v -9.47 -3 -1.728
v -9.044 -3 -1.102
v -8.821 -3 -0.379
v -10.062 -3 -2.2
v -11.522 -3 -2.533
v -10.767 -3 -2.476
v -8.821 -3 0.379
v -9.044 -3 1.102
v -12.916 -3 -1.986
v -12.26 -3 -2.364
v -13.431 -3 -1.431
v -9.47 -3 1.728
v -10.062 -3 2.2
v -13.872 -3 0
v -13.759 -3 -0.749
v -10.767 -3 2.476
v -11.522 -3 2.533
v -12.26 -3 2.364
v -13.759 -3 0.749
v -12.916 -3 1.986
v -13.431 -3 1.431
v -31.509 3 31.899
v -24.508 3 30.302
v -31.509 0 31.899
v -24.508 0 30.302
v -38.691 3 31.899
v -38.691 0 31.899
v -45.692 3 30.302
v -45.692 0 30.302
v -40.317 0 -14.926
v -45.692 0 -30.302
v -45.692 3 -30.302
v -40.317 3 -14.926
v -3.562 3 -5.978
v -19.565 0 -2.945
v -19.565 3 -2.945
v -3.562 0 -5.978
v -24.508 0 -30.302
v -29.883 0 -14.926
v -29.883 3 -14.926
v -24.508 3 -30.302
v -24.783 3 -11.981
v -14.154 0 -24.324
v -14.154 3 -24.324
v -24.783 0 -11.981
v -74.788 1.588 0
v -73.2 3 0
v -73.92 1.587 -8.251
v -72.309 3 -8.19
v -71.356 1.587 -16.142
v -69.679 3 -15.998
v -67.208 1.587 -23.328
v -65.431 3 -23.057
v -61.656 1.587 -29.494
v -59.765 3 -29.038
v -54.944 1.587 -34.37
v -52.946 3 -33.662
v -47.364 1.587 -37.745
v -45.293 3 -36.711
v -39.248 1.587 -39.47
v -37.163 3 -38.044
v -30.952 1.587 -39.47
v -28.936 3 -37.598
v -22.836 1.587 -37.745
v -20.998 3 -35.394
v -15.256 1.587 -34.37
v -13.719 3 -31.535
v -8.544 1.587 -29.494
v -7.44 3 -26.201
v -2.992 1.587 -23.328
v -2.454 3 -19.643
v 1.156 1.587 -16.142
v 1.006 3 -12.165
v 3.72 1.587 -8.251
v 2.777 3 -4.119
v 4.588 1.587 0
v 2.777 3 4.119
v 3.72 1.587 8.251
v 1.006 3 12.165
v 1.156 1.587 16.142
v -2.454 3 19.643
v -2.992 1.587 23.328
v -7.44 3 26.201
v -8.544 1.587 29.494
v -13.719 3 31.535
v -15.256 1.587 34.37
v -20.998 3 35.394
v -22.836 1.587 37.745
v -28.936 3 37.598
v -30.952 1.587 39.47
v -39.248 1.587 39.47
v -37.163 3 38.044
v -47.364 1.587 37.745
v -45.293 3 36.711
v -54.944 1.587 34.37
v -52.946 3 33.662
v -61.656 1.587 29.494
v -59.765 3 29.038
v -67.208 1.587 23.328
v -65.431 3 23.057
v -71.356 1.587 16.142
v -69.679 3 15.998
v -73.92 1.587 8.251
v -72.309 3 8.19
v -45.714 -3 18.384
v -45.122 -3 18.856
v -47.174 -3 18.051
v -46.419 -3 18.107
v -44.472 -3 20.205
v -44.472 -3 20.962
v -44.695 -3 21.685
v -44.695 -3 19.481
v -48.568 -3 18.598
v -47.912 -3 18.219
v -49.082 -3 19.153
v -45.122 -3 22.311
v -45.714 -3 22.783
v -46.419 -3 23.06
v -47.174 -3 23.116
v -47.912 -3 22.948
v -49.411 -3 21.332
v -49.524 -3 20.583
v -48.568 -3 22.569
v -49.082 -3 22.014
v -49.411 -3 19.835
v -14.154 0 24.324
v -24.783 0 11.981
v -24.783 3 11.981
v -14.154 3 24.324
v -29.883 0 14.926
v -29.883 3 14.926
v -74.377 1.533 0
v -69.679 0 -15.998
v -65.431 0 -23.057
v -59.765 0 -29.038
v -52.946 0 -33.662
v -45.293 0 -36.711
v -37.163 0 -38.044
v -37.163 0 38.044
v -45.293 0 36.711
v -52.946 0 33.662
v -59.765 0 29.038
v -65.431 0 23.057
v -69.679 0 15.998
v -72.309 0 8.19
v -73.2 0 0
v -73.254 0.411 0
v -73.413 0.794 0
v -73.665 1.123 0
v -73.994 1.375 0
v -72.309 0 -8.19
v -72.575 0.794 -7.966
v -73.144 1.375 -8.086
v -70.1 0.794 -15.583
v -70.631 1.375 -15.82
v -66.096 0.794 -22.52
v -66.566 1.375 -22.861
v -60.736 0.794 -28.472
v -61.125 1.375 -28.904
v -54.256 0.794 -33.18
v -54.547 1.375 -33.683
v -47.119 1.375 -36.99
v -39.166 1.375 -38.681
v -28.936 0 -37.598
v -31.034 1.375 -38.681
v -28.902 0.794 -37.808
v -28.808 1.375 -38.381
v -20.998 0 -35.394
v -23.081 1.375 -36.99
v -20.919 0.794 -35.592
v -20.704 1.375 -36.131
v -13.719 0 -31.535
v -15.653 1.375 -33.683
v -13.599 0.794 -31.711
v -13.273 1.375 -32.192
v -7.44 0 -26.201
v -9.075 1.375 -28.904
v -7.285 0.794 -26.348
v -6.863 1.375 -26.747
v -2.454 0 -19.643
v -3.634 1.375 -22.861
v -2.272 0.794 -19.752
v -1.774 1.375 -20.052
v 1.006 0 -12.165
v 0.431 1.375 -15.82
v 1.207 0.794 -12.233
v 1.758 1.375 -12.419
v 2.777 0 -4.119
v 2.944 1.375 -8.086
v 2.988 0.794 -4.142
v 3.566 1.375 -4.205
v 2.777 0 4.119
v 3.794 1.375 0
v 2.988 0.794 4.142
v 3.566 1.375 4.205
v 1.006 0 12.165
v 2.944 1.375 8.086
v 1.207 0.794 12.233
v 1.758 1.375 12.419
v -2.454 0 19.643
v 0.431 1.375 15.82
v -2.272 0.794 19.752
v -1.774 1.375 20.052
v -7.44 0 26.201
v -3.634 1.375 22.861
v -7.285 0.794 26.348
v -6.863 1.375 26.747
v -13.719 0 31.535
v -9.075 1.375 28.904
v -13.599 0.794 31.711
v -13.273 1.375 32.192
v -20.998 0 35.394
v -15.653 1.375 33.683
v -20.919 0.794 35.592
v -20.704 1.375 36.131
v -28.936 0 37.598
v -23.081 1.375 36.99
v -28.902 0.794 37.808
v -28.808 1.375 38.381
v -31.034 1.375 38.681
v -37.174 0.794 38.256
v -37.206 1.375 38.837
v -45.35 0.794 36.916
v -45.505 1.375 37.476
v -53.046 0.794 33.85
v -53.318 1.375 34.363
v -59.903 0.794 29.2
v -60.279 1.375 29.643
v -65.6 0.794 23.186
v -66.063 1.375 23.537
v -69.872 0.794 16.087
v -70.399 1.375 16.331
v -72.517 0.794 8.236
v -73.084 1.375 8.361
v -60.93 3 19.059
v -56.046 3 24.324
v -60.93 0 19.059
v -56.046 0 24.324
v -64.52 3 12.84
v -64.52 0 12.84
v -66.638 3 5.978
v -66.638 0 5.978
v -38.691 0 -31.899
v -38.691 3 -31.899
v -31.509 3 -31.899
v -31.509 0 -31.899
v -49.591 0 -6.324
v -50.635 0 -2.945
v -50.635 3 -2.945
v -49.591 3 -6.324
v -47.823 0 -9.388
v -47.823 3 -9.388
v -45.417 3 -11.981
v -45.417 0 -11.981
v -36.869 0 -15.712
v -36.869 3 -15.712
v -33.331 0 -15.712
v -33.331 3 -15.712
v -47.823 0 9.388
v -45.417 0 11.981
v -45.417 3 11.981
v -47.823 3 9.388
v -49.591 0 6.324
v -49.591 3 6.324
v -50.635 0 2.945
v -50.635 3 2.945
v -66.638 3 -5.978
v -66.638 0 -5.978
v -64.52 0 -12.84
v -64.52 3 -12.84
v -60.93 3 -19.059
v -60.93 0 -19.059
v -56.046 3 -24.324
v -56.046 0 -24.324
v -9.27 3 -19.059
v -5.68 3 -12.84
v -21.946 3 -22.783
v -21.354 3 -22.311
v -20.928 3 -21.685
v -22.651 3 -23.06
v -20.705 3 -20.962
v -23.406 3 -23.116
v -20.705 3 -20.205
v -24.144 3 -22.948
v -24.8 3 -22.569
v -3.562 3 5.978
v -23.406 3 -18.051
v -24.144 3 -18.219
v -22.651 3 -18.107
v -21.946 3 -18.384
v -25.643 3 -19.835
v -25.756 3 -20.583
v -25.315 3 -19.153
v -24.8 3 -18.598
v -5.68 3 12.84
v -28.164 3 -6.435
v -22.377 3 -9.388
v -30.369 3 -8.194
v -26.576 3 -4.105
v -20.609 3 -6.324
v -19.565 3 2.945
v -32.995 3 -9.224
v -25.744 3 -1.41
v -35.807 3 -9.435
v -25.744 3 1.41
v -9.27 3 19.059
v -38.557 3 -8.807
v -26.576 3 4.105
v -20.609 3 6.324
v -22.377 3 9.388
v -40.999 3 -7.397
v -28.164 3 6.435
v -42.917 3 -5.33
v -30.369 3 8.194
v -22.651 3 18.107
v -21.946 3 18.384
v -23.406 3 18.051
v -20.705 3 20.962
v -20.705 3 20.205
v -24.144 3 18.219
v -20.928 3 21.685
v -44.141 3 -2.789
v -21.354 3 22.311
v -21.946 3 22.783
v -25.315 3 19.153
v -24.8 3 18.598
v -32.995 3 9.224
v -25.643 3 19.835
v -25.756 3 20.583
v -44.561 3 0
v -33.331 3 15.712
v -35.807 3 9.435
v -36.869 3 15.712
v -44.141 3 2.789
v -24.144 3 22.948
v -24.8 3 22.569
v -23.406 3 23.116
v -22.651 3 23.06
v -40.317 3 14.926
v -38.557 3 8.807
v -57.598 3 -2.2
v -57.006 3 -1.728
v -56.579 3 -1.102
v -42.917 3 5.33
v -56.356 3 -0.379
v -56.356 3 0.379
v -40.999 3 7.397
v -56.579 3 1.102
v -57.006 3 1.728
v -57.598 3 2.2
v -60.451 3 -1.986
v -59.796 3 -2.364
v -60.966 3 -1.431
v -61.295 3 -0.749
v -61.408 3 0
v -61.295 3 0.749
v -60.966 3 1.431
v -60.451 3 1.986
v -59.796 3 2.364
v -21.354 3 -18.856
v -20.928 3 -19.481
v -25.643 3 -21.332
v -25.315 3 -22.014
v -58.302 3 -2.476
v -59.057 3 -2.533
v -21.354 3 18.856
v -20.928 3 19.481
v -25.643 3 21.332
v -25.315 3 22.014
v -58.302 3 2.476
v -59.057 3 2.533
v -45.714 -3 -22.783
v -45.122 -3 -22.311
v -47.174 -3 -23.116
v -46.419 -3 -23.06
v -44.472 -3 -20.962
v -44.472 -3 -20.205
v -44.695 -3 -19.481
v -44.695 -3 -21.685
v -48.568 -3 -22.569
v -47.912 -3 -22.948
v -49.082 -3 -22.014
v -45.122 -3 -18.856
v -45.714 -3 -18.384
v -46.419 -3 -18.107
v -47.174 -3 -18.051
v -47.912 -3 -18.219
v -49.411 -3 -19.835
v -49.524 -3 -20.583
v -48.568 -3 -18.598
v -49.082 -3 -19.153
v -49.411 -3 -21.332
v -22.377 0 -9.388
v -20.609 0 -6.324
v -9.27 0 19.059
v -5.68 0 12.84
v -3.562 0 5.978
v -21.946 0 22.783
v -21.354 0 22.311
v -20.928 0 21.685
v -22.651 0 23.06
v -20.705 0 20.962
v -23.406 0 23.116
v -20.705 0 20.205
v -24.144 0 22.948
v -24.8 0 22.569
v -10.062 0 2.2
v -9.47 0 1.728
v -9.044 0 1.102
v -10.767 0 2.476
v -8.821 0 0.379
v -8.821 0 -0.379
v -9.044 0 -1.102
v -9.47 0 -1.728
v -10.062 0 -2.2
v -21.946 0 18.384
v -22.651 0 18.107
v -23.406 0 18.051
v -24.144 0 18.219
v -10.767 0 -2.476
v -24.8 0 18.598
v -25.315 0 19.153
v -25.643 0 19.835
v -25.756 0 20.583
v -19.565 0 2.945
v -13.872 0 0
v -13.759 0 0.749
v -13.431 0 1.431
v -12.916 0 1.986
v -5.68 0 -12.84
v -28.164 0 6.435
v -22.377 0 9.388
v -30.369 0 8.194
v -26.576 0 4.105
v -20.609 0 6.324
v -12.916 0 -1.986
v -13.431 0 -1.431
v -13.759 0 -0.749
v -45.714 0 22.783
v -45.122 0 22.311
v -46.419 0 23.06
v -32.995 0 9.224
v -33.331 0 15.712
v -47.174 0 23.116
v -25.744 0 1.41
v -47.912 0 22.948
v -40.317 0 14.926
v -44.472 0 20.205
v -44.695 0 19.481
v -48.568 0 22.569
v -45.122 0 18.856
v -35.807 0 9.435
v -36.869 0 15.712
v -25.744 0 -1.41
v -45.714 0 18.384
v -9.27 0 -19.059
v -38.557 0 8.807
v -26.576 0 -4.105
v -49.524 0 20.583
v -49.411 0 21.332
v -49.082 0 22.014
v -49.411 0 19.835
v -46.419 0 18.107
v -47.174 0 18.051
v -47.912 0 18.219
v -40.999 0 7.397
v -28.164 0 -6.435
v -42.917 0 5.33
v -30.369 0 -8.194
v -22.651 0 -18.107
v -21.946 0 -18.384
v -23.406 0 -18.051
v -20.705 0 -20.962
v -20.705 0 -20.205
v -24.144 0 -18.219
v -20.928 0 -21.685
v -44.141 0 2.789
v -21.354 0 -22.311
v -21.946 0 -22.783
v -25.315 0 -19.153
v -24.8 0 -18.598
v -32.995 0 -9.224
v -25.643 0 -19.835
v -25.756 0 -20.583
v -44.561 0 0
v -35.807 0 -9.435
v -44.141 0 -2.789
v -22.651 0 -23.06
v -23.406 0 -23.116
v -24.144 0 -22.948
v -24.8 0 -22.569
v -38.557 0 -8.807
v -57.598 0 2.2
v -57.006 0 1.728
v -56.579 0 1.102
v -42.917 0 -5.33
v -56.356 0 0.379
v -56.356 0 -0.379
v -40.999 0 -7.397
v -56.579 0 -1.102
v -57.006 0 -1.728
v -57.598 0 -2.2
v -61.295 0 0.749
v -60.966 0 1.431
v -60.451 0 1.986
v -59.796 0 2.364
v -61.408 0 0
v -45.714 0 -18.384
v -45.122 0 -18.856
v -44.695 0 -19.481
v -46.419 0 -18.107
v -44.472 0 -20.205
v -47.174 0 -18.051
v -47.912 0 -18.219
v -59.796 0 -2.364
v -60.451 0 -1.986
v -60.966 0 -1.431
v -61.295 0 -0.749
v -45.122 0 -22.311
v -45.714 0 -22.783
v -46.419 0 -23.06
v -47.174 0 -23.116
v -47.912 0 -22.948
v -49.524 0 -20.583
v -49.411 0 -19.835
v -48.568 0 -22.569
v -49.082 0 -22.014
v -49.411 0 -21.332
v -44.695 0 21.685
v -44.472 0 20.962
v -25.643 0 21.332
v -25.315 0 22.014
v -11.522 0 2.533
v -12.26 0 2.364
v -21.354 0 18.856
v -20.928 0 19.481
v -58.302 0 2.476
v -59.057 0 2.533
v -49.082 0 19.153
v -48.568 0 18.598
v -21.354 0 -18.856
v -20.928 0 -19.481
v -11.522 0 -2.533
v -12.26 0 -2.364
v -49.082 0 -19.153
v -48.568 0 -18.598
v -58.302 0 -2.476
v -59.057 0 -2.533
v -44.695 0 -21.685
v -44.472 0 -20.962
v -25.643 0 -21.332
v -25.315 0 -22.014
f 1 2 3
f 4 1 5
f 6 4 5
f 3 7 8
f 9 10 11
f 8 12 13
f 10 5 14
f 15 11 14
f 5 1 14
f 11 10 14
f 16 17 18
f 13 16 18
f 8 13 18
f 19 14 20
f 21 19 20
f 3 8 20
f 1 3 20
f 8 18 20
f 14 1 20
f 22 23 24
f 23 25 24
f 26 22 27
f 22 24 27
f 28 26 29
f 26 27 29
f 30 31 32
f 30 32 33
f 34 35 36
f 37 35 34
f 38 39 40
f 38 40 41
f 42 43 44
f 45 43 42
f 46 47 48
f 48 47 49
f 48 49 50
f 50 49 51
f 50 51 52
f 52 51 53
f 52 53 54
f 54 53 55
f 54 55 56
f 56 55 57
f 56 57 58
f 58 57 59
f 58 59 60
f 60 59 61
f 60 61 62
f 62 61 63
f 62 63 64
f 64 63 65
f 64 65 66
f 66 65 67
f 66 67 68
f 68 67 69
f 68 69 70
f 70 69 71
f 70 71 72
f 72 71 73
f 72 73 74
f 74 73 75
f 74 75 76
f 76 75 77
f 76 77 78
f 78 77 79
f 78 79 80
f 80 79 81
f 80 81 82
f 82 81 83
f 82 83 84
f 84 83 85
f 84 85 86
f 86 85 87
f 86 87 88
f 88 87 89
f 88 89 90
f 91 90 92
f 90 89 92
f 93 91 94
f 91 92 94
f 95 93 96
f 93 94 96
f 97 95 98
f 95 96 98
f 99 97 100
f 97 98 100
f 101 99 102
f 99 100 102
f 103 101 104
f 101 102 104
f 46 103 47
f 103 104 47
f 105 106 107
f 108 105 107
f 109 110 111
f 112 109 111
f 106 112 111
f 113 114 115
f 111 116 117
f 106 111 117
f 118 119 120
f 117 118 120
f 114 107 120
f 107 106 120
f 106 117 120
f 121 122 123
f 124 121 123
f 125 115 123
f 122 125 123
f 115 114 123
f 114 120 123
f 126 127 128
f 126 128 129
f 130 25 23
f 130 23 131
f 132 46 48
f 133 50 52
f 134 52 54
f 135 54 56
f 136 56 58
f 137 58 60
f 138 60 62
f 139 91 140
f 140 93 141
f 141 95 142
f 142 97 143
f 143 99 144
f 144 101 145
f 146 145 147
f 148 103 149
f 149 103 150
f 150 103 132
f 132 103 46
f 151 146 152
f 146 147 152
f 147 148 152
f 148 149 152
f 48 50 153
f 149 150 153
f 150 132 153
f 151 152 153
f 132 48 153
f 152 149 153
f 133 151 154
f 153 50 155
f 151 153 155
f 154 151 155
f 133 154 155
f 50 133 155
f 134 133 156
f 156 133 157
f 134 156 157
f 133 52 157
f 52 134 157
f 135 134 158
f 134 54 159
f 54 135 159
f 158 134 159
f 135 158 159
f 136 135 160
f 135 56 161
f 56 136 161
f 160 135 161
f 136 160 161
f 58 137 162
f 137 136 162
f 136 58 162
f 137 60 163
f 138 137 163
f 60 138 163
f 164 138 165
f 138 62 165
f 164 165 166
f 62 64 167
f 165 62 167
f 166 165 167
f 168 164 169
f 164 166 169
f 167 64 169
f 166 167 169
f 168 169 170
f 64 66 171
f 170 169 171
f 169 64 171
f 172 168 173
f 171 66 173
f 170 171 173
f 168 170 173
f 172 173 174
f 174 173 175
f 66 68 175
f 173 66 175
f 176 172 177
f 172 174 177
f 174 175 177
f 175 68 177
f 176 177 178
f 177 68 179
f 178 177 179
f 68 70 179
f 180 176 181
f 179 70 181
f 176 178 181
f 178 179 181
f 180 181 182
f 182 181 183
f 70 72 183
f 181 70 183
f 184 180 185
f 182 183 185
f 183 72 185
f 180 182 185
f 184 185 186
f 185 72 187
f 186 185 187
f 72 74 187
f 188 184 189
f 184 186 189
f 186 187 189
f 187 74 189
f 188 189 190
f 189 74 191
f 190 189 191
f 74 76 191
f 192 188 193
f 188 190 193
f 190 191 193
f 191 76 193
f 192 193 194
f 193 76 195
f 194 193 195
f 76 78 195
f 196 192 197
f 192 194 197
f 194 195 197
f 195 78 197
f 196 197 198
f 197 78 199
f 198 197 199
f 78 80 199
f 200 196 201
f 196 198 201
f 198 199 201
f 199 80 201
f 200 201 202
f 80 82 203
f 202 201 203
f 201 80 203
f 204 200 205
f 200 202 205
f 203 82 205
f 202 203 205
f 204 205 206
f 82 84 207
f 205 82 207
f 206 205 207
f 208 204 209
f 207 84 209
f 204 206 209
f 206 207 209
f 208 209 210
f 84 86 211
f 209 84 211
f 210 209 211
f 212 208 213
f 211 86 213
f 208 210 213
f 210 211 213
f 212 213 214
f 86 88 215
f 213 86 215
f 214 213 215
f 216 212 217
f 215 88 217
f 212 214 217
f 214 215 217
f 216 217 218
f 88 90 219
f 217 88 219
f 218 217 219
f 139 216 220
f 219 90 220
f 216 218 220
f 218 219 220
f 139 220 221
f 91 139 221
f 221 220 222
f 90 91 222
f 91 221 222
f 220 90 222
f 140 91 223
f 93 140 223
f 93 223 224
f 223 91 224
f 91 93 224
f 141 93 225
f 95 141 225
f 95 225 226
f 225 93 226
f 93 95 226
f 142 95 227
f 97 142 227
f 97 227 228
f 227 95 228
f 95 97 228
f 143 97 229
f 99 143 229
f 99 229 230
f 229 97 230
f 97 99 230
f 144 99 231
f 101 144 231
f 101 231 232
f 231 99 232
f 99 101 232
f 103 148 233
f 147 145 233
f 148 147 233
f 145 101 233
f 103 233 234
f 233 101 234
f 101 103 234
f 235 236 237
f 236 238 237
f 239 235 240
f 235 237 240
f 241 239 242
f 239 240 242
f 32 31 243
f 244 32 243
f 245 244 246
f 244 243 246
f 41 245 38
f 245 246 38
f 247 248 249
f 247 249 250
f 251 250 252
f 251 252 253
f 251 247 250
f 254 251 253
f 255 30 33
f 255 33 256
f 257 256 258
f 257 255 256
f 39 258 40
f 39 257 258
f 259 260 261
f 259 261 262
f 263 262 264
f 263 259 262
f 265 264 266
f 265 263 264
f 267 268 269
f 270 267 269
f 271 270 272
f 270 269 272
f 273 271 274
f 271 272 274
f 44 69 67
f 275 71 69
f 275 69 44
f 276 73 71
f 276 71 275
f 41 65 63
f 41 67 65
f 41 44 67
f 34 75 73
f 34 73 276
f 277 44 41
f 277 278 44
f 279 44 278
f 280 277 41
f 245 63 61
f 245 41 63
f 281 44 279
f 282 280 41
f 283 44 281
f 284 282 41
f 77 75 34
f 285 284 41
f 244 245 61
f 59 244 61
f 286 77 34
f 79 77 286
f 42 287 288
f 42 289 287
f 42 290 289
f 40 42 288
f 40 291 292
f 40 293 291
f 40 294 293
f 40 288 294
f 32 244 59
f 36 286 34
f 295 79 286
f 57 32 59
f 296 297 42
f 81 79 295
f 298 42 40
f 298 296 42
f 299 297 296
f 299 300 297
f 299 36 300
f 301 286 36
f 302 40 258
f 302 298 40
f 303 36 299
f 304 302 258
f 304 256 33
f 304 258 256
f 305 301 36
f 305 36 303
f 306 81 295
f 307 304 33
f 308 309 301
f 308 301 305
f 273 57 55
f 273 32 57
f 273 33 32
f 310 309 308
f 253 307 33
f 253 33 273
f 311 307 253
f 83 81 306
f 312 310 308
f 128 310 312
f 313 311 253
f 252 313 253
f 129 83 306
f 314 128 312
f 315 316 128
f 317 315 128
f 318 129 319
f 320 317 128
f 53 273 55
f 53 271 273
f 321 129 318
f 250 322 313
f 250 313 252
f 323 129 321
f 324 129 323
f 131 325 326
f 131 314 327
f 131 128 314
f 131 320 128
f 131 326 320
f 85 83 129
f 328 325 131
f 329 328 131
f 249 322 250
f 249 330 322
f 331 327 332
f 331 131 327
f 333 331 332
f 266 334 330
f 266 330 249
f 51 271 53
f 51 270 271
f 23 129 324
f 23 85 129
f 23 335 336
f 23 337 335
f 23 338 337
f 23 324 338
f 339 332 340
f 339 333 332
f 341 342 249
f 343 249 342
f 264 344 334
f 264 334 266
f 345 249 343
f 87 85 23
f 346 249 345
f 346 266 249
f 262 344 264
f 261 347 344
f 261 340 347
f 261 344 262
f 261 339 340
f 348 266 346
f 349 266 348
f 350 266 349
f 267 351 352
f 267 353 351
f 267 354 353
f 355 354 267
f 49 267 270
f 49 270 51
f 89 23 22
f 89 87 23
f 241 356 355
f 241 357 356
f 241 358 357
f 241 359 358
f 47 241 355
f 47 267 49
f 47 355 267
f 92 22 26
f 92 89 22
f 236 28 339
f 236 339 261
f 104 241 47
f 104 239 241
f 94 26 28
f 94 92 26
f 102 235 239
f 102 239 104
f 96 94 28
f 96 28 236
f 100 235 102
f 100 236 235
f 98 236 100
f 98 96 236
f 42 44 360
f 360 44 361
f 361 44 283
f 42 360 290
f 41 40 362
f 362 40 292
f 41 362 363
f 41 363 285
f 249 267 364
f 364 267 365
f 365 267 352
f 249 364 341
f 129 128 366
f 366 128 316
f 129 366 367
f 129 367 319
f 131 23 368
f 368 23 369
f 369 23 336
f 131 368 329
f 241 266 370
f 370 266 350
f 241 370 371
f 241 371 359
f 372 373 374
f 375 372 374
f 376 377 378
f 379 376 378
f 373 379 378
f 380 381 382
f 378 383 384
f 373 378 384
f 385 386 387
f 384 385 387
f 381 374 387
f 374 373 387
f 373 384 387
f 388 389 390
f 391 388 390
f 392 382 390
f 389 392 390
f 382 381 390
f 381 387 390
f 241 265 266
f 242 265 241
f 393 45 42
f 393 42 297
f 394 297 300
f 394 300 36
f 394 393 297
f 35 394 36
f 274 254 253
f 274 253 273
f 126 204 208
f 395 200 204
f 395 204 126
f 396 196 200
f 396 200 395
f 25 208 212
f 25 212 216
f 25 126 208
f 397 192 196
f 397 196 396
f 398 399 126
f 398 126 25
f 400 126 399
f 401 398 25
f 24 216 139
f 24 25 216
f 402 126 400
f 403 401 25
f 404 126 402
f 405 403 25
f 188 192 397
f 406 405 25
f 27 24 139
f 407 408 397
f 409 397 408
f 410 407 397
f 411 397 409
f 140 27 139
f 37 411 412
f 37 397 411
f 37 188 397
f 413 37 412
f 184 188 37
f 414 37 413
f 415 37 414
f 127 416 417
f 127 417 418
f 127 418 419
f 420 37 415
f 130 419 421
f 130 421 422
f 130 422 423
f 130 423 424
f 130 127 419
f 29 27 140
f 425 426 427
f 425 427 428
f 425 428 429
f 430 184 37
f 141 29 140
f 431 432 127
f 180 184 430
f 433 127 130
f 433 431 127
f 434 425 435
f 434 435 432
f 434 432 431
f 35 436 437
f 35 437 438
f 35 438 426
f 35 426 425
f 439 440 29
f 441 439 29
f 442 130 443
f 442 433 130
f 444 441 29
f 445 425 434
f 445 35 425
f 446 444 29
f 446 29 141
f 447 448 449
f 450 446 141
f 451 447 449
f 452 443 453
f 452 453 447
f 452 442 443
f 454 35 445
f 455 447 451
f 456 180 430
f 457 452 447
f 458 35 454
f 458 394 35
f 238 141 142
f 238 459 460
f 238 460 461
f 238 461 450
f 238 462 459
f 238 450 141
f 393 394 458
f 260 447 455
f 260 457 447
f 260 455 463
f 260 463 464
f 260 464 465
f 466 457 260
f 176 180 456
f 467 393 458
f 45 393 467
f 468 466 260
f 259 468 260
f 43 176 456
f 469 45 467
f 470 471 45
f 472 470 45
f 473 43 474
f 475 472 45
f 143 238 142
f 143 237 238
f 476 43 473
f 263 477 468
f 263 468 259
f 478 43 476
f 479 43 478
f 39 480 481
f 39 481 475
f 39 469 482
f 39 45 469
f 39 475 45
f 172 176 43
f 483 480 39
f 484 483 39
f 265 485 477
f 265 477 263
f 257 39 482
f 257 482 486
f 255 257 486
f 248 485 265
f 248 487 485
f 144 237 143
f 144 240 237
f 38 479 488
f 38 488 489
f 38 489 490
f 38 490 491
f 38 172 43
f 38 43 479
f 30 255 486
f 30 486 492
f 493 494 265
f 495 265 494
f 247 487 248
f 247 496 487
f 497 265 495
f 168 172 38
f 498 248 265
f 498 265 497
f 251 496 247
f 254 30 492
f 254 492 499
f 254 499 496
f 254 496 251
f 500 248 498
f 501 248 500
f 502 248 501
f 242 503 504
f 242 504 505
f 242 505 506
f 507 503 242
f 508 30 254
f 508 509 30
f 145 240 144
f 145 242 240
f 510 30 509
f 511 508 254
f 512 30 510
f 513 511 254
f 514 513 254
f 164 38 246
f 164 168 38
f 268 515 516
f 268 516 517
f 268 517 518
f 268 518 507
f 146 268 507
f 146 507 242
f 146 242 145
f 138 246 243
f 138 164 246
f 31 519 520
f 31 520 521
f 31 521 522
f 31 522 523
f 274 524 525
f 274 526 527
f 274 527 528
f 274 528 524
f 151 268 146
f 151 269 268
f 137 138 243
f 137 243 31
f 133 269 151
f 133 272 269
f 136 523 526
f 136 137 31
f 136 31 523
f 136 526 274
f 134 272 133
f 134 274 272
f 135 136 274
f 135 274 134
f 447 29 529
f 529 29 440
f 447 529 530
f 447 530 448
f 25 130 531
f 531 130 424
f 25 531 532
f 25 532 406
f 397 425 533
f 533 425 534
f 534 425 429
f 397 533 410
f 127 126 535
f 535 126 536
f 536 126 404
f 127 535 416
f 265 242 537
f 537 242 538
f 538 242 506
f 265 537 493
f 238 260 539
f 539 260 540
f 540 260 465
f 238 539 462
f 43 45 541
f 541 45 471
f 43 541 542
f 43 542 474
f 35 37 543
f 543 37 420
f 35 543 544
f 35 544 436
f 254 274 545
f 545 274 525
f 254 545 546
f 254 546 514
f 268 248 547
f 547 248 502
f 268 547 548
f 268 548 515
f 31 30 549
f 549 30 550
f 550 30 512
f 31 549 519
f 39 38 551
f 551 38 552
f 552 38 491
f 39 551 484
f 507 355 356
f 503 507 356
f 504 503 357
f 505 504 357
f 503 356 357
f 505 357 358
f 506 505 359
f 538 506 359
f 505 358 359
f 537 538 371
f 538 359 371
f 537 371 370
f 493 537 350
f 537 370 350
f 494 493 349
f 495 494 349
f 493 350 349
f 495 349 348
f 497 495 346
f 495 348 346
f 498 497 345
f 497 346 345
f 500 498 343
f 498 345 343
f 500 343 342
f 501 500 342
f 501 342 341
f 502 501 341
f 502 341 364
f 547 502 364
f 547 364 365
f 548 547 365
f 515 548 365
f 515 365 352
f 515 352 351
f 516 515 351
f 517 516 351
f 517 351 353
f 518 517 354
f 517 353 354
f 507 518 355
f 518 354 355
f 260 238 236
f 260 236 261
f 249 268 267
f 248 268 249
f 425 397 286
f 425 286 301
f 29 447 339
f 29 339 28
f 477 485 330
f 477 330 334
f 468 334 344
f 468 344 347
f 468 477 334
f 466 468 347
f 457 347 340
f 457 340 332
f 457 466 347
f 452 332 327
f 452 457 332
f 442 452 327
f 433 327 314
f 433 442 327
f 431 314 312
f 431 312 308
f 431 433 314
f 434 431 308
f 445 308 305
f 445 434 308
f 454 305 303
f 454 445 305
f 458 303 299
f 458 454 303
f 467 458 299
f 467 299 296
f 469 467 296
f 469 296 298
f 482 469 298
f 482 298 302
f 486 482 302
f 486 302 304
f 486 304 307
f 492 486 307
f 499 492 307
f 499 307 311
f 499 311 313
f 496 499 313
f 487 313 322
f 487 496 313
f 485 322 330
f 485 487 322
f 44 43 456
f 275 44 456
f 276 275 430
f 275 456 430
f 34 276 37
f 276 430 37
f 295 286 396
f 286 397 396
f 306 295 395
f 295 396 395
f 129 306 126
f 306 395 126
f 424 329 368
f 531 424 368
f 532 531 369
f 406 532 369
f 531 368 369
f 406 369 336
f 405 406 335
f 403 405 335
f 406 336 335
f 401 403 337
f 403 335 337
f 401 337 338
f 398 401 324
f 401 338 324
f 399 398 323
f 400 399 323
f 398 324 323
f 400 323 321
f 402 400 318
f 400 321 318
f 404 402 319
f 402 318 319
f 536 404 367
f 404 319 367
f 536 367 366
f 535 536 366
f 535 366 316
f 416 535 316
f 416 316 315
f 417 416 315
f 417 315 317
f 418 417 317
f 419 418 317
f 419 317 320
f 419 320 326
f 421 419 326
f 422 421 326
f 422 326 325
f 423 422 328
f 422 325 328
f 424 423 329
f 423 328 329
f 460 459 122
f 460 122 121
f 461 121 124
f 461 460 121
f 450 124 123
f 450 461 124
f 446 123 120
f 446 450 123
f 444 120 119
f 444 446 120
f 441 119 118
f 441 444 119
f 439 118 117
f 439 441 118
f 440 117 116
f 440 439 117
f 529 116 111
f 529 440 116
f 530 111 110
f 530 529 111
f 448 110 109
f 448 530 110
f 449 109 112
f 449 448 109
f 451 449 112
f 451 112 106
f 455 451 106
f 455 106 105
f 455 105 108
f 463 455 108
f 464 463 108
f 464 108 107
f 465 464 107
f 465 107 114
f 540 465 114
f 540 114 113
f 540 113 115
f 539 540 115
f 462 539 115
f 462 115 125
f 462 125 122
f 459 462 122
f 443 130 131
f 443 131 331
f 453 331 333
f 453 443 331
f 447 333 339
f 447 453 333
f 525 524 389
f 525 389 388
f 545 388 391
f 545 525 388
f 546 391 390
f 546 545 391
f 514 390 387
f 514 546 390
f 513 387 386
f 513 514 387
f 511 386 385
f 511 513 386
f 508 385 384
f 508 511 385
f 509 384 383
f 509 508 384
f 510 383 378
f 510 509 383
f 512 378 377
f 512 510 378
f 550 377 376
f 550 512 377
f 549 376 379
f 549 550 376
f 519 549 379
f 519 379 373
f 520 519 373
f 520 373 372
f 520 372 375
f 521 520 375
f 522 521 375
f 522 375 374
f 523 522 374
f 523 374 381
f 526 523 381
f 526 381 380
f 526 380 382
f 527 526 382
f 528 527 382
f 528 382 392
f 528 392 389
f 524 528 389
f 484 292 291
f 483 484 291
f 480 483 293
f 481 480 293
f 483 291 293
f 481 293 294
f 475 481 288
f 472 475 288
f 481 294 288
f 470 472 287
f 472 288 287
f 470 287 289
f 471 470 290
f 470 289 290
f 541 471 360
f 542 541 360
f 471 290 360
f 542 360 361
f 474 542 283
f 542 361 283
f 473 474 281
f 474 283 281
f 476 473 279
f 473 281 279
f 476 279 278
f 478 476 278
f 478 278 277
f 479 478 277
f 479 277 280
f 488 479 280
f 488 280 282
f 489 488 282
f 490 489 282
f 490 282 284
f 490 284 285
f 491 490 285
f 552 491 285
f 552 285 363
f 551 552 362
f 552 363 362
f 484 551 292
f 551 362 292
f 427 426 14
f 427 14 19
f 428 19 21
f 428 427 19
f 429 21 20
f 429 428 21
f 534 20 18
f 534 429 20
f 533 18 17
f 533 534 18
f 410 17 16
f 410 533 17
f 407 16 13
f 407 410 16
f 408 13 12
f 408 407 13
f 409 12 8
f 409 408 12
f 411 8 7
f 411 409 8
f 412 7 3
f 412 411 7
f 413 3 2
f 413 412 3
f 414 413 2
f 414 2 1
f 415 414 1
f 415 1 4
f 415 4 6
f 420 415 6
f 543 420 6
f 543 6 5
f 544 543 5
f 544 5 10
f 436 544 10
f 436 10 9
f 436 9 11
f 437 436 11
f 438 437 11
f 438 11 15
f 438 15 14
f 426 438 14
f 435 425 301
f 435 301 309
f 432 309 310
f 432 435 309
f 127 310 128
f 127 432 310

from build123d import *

# Parameters (mm, degrees)
BOSS_EXTRUDE1_START = -3
SKETCH2_R           = 9.461289508
BOSS_EXTRUDE1_DEPTH = 3
SKETCH3_R           = 2.54
BOSS_EXTRUDE2_DEPTH = 6
SKETCH4_R           = 2.54
CUT_EXTRUDE1_DEPTH  = 3


with BuildPart() as part:
    # Sketch1 → Revolve1 (revolve)
    with BuildSketch(Plane.XY, mode=Mode.PRIVATE) as revolve1_sk:
        with BuildLine():
            Line((-3, 3), (-3, 0))
            Line((-3, 0), (3, 0))
            ThreePointArc((3, 0), (3.464967985, 1.122532015), (4.5875, 1.5875))
            Line((4.5875, 1.5875), (3, 3))
            Line((3, 3), (0, 3))
            Line((0, 3), (-3, 3))
        make_face()
    revolve(revolve1_sk.sketch.rotate(Axis((-35.1, 18.916479231, 0), (0, -1, 0)), 180), axis=Axis((-35.1, 18.916479231, 0), (0, -1, 0)))

    # Sketch2 → Boss-Extrude1 (add)
    with BuildSketch(Plane(origin=(0, 3, 0), x_dir=(1, 0, 0), z_dir=(0, 1, 0)).offset(BOSS_EXTRUDE1_START)):
        with BuildLine():
            Line((-45.417440708, 11.981122365), (-56.04641595, 24.324014037))
            ThreePointArc((-56.04641595, 24.324014037), (-51.15, 27.799415461), (-45.692006103, 30.302135349))
            Line((-45.692006103, 30.302135349), (-40.31723598, 14.925726938))
            ThreePointArc((-40.31723598, 14.925726938), (-35.1, 15.811289508), (-29.88276402, 14.925726938))
            Line((-29.88276402, 14.925726938), (-24.507993897, 30.302135349))
            ThreePointArc((-24.507993897, 30.302135349), (-19.05, 27.799415461), (-14.15358405, 24.324014037))
            Line((-14.15358405, 24.324014037), (-24.782559292, 11.981122365))
            ThreePointArc((-24.782559292, 11.981122365), (-21.40702162, 7.905644754), (-19.565323312, 2.944604573))
            Line((-19.565323312, 2.944604573), (-3.561577947, 5.978121313))
            ThreePointArc((-3.561577947, 5.978121313), (-3, 0), (-3.561577947, -5.978121313))
            Line((-3.561577947, -5.978121313), (-19.565323312, -2.944604573))
            ThreePointArc((-19.565323312, -2.944604573), (-21.40702162, -7.905644754), (-24.782559292, -11.981122365))
            Line((-24.782559292, -11.981122365), (-14.15358405, -24.324014037))
            ThreePointArc((-14.15358405, -24.324014037), (-19.05, -27.799415461), (-24.507993897, -30.302135349))
            Line((-24.507993897, -30.302135349), (-29.88276402, -14.925726938))
            ThreePointArc((-29.88276402, -14.925726938), (-35.1, -15.811289508), (-40.31723598, -14.925726938))
            Line((-40.31723598, -14.925726938), (-45.692006103, -30.302135349))
            ThreePointArc((-45.692006103, -30.302135349), (-51.15, -27.799415461), (-56.04641595, -24.324014037))
            Line((-56.04641595, -24.324014037), (-45.417440708, -11.981122365))
            ThreePointArc((-45.417440708, -11.981122365), (-48.79297838, -7.905644754), (-50.634676688, -2.944604573))
            Line((-50.634676688, -2.944604573), (-66.638422053, -5.978121313))
            ThreePointArc((-66.638422053, -5.978121313), (-67.2, 0), (-66.638422053, 5.978121313))
            Line((-66.638422053, 5.978121313), (-50.634676688, 2.944604573))
            ThreePointArc((-50.634676688, 2.944604573), (-48.79297838, 7.905644754), (-45.417440708, 11.981122365))
        make_face()
        with Locations(Location((-35.1, 0, 0), (0, 0, 180))):
            Circle(SKETCH2_R, mode=Mode.SUBTRACT)
    extrude(amount=BOSS_EXTRUDE1_DEPTH)

    # Sketch3 → Boss-Extrude2 (add)
    with BuildSketch(Plane(origin=(0, 3, 0), x_dir=(1, 0, 0), z_dir=(0, 1, 0))):
        with Locations(Location((-46.983837426, 20.583410211, 0), (0, 0, 180))):
            Circle(SKETCH3_R)
        with Locations(Location((-11.332325148, 0, 0), (0, 0, 180))):
            Circle(SKETCH3_R)
        with Locations(Location((-46.983837426, -20.583410211, 0), (0, 0, 180))):
            Circle(SKETCH3_R)
    extrude(amount=-BOSS_EXTRUDE2_DEPTH)

    # Sketch4 → Cut-Extrude1 (cut)
    with BuildSketch(Plane(origin=(0, 3, 0), x_dir=(1, 0, 0), z_dir=(0, 1, 0))):
        with Locations(Location((-23.216162574, 20.583410211, 0), (0, 0, 180))):
            Circle(SKETCH4_R)
        with Locations(Location((-23.216162574, -20.583410211, 0), (0, 0, 180))):
            Circle(SKETCH4_R)
        with Locations(Location((-58.867674852, 0, 0), (0, 0, 180))):
            Circle(SKETCH4_R)
    extrude(amount=-CUT_EXTRUDE1_DEPTH, mode=Mode.SUBTRACT)


solid = part.part
